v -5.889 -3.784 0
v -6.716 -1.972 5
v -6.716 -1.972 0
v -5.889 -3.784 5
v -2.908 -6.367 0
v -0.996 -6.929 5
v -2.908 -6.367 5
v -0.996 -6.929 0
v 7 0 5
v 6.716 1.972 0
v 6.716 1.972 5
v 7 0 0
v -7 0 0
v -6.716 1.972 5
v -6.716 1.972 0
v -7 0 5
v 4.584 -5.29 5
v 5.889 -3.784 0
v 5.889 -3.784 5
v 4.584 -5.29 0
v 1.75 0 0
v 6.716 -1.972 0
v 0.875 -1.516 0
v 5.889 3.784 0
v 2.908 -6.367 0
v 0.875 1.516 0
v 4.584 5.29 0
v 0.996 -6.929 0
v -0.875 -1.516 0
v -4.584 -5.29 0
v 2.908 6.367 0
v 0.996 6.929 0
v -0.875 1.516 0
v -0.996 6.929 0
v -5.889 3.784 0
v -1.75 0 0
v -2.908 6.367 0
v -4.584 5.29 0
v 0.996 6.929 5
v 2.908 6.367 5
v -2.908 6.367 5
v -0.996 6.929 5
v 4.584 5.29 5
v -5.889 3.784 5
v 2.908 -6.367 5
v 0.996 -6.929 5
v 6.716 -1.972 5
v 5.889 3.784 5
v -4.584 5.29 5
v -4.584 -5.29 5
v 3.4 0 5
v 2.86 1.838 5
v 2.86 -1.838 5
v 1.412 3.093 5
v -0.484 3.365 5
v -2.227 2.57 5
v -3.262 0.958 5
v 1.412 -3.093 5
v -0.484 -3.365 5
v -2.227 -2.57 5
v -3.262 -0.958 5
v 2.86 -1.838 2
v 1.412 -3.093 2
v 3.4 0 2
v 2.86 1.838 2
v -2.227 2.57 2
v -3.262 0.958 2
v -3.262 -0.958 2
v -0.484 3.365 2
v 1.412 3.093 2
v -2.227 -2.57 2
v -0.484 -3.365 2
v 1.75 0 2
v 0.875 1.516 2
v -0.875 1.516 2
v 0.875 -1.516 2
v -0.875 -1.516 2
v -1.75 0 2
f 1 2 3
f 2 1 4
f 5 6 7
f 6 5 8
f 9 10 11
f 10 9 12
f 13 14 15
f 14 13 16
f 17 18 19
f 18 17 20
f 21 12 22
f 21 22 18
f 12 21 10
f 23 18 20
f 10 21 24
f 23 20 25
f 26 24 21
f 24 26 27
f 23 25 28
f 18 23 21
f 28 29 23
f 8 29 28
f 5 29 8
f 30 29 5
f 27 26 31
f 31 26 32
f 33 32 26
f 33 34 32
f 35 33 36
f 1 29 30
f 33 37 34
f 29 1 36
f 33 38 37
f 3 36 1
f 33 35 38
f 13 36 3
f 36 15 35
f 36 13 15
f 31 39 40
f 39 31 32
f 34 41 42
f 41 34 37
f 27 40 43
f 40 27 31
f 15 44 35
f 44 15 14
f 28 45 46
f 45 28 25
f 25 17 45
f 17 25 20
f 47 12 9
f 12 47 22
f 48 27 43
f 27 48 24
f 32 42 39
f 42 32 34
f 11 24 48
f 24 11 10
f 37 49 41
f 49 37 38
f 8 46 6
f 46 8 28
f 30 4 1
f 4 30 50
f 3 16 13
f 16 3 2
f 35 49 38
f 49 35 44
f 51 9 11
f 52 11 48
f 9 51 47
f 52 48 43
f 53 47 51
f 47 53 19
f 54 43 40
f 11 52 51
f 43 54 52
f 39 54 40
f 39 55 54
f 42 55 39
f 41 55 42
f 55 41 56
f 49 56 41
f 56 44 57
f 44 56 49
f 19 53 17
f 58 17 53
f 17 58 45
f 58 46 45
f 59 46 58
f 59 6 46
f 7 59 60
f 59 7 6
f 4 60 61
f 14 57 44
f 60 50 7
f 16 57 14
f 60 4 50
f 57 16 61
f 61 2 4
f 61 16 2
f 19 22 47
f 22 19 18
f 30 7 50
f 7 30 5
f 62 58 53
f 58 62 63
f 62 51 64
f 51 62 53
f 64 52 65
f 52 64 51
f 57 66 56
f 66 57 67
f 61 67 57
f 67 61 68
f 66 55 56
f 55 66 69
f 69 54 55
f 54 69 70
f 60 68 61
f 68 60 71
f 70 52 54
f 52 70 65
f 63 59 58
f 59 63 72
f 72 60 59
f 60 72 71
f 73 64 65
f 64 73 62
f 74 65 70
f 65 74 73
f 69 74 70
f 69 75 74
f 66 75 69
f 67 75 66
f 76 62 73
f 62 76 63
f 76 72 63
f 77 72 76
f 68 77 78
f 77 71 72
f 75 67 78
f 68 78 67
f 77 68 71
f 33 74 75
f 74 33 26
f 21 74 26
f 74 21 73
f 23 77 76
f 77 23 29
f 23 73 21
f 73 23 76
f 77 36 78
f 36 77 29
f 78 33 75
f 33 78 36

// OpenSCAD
//Round Thumb Knob
translate([0,0,5])rotate([180,0,0]){
	difference(){
		linear_extrude(height=5)circle(7);
		linear_extrude(height=3)circle(3.4);
		cylinder(10,1.75,1.75);
	}
}
